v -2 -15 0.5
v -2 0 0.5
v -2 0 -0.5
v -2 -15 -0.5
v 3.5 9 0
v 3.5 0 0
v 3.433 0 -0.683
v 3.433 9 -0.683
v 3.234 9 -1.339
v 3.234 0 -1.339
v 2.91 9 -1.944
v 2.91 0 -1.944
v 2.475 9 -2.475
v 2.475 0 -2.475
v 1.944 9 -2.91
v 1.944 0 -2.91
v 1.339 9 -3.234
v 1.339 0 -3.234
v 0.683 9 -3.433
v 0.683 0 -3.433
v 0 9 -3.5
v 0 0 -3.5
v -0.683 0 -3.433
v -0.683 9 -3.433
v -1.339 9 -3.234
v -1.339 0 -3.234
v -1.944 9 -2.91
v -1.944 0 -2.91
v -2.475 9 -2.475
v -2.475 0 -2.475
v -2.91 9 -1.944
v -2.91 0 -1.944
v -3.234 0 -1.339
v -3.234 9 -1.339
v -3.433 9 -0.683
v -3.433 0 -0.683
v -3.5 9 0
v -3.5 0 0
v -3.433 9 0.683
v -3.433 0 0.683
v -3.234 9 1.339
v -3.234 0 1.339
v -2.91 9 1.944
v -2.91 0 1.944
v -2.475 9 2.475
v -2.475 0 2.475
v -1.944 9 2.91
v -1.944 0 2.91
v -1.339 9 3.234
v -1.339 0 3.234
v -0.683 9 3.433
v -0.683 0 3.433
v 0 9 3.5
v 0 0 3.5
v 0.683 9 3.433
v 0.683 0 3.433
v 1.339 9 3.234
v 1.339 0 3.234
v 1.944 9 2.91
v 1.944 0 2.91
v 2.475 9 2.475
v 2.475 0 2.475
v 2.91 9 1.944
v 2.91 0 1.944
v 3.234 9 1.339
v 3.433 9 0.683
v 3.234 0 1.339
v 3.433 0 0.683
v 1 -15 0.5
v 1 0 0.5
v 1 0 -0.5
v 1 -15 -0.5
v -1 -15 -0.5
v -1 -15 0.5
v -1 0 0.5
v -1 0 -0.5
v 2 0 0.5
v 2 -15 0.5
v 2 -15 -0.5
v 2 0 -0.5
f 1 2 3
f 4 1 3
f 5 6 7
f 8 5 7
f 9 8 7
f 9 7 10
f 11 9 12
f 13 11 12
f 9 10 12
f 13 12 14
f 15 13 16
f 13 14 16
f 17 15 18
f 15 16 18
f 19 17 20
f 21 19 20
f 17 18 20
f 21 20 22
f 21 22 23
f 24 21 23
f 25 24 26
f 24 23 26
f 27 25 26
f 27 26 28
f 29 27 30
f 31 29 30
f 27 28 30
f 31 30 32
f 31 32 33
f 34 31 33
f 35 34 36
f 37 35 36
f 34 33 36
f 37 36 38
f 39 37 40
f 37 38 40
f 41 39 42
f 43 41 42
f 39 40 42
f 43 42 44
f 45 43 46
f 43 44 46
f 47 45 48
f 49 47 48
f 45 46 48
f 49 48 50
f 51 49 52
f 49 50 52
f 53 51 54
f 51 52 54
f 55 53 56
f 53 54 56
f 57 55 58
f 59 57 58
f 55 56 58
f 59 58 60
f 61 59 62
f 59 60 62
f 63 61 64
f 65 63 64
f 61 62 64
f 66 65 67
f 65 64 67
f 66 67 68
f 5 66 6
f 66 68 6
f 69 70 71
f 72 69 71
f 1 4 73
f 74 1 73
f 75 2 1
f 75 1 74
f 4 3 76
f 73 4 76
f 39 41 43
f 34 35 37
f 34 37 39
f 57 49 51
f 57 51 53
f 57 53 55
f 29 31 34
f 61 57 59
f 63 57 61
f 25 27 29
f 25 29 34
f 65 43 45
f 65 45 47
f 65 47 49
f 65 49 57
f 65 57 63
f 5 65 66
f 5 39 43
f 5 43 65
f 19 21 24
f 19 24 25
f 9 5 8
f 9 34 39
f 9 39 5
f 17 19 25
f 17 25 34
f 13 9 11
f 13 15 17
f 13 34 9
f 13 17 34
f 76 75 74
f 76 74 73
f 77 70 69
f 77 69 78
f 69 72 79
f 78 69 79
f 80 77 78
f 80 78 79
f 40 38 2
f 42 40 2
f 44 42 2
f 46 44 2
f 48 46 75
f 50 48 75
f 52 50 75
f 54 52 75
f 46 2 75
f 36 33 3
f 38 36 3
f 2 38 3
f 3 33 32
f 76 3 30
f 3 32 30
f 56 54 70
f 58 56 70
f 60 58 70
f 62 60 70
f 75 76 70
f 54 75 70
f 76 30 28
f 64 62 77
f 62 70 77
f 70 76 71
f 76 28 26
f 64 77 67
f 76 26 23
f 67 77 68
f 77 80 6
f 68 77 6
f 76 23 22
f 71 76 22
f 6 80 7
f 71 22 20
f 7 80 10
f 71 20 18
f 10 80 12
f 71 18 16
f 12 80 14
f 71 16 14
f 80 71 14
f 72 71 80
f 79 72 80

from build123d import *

# Parameters (mm, degrees)
SKETCH1_R           = 3.5
BOSS_EXTRUDE1_DEPTH = 9
SKETCH2_W           = 1
SKETCH2_H           = 1
BOSS_EXTRUDE2_DEPTH = 24


with BuildPart() as part:
    # Sketch1 → Boss-Extrude1 (new body)
    with BuildSketch(Plane(origin=(0, 0, 0), x_dir=(1, 0, 0), z_dir=(0, 1, 0))):
        Circle(SKETCH1_R)
    extrude(amount=BOSS_EXTRUDE1_DEPTH)

    # Sketch2 → Boss-Extrude2 (add)
    with BuildSketch(Plane(origin=(0, 9, 0), x_dir=(1, 0, 0), z_dir=(0, 1, 0))):
        with Locations((-1.5, 0)):
            Rectangle(SKETCH2_W, SKETCH2_H)
        with Locations((1.5, 0)):
            Rectangle(SKETCH2_W, SKETCH2_H)
    extrude(amount=-BOSS_EXTRUDE2_DEPTH)


solid = part.part
